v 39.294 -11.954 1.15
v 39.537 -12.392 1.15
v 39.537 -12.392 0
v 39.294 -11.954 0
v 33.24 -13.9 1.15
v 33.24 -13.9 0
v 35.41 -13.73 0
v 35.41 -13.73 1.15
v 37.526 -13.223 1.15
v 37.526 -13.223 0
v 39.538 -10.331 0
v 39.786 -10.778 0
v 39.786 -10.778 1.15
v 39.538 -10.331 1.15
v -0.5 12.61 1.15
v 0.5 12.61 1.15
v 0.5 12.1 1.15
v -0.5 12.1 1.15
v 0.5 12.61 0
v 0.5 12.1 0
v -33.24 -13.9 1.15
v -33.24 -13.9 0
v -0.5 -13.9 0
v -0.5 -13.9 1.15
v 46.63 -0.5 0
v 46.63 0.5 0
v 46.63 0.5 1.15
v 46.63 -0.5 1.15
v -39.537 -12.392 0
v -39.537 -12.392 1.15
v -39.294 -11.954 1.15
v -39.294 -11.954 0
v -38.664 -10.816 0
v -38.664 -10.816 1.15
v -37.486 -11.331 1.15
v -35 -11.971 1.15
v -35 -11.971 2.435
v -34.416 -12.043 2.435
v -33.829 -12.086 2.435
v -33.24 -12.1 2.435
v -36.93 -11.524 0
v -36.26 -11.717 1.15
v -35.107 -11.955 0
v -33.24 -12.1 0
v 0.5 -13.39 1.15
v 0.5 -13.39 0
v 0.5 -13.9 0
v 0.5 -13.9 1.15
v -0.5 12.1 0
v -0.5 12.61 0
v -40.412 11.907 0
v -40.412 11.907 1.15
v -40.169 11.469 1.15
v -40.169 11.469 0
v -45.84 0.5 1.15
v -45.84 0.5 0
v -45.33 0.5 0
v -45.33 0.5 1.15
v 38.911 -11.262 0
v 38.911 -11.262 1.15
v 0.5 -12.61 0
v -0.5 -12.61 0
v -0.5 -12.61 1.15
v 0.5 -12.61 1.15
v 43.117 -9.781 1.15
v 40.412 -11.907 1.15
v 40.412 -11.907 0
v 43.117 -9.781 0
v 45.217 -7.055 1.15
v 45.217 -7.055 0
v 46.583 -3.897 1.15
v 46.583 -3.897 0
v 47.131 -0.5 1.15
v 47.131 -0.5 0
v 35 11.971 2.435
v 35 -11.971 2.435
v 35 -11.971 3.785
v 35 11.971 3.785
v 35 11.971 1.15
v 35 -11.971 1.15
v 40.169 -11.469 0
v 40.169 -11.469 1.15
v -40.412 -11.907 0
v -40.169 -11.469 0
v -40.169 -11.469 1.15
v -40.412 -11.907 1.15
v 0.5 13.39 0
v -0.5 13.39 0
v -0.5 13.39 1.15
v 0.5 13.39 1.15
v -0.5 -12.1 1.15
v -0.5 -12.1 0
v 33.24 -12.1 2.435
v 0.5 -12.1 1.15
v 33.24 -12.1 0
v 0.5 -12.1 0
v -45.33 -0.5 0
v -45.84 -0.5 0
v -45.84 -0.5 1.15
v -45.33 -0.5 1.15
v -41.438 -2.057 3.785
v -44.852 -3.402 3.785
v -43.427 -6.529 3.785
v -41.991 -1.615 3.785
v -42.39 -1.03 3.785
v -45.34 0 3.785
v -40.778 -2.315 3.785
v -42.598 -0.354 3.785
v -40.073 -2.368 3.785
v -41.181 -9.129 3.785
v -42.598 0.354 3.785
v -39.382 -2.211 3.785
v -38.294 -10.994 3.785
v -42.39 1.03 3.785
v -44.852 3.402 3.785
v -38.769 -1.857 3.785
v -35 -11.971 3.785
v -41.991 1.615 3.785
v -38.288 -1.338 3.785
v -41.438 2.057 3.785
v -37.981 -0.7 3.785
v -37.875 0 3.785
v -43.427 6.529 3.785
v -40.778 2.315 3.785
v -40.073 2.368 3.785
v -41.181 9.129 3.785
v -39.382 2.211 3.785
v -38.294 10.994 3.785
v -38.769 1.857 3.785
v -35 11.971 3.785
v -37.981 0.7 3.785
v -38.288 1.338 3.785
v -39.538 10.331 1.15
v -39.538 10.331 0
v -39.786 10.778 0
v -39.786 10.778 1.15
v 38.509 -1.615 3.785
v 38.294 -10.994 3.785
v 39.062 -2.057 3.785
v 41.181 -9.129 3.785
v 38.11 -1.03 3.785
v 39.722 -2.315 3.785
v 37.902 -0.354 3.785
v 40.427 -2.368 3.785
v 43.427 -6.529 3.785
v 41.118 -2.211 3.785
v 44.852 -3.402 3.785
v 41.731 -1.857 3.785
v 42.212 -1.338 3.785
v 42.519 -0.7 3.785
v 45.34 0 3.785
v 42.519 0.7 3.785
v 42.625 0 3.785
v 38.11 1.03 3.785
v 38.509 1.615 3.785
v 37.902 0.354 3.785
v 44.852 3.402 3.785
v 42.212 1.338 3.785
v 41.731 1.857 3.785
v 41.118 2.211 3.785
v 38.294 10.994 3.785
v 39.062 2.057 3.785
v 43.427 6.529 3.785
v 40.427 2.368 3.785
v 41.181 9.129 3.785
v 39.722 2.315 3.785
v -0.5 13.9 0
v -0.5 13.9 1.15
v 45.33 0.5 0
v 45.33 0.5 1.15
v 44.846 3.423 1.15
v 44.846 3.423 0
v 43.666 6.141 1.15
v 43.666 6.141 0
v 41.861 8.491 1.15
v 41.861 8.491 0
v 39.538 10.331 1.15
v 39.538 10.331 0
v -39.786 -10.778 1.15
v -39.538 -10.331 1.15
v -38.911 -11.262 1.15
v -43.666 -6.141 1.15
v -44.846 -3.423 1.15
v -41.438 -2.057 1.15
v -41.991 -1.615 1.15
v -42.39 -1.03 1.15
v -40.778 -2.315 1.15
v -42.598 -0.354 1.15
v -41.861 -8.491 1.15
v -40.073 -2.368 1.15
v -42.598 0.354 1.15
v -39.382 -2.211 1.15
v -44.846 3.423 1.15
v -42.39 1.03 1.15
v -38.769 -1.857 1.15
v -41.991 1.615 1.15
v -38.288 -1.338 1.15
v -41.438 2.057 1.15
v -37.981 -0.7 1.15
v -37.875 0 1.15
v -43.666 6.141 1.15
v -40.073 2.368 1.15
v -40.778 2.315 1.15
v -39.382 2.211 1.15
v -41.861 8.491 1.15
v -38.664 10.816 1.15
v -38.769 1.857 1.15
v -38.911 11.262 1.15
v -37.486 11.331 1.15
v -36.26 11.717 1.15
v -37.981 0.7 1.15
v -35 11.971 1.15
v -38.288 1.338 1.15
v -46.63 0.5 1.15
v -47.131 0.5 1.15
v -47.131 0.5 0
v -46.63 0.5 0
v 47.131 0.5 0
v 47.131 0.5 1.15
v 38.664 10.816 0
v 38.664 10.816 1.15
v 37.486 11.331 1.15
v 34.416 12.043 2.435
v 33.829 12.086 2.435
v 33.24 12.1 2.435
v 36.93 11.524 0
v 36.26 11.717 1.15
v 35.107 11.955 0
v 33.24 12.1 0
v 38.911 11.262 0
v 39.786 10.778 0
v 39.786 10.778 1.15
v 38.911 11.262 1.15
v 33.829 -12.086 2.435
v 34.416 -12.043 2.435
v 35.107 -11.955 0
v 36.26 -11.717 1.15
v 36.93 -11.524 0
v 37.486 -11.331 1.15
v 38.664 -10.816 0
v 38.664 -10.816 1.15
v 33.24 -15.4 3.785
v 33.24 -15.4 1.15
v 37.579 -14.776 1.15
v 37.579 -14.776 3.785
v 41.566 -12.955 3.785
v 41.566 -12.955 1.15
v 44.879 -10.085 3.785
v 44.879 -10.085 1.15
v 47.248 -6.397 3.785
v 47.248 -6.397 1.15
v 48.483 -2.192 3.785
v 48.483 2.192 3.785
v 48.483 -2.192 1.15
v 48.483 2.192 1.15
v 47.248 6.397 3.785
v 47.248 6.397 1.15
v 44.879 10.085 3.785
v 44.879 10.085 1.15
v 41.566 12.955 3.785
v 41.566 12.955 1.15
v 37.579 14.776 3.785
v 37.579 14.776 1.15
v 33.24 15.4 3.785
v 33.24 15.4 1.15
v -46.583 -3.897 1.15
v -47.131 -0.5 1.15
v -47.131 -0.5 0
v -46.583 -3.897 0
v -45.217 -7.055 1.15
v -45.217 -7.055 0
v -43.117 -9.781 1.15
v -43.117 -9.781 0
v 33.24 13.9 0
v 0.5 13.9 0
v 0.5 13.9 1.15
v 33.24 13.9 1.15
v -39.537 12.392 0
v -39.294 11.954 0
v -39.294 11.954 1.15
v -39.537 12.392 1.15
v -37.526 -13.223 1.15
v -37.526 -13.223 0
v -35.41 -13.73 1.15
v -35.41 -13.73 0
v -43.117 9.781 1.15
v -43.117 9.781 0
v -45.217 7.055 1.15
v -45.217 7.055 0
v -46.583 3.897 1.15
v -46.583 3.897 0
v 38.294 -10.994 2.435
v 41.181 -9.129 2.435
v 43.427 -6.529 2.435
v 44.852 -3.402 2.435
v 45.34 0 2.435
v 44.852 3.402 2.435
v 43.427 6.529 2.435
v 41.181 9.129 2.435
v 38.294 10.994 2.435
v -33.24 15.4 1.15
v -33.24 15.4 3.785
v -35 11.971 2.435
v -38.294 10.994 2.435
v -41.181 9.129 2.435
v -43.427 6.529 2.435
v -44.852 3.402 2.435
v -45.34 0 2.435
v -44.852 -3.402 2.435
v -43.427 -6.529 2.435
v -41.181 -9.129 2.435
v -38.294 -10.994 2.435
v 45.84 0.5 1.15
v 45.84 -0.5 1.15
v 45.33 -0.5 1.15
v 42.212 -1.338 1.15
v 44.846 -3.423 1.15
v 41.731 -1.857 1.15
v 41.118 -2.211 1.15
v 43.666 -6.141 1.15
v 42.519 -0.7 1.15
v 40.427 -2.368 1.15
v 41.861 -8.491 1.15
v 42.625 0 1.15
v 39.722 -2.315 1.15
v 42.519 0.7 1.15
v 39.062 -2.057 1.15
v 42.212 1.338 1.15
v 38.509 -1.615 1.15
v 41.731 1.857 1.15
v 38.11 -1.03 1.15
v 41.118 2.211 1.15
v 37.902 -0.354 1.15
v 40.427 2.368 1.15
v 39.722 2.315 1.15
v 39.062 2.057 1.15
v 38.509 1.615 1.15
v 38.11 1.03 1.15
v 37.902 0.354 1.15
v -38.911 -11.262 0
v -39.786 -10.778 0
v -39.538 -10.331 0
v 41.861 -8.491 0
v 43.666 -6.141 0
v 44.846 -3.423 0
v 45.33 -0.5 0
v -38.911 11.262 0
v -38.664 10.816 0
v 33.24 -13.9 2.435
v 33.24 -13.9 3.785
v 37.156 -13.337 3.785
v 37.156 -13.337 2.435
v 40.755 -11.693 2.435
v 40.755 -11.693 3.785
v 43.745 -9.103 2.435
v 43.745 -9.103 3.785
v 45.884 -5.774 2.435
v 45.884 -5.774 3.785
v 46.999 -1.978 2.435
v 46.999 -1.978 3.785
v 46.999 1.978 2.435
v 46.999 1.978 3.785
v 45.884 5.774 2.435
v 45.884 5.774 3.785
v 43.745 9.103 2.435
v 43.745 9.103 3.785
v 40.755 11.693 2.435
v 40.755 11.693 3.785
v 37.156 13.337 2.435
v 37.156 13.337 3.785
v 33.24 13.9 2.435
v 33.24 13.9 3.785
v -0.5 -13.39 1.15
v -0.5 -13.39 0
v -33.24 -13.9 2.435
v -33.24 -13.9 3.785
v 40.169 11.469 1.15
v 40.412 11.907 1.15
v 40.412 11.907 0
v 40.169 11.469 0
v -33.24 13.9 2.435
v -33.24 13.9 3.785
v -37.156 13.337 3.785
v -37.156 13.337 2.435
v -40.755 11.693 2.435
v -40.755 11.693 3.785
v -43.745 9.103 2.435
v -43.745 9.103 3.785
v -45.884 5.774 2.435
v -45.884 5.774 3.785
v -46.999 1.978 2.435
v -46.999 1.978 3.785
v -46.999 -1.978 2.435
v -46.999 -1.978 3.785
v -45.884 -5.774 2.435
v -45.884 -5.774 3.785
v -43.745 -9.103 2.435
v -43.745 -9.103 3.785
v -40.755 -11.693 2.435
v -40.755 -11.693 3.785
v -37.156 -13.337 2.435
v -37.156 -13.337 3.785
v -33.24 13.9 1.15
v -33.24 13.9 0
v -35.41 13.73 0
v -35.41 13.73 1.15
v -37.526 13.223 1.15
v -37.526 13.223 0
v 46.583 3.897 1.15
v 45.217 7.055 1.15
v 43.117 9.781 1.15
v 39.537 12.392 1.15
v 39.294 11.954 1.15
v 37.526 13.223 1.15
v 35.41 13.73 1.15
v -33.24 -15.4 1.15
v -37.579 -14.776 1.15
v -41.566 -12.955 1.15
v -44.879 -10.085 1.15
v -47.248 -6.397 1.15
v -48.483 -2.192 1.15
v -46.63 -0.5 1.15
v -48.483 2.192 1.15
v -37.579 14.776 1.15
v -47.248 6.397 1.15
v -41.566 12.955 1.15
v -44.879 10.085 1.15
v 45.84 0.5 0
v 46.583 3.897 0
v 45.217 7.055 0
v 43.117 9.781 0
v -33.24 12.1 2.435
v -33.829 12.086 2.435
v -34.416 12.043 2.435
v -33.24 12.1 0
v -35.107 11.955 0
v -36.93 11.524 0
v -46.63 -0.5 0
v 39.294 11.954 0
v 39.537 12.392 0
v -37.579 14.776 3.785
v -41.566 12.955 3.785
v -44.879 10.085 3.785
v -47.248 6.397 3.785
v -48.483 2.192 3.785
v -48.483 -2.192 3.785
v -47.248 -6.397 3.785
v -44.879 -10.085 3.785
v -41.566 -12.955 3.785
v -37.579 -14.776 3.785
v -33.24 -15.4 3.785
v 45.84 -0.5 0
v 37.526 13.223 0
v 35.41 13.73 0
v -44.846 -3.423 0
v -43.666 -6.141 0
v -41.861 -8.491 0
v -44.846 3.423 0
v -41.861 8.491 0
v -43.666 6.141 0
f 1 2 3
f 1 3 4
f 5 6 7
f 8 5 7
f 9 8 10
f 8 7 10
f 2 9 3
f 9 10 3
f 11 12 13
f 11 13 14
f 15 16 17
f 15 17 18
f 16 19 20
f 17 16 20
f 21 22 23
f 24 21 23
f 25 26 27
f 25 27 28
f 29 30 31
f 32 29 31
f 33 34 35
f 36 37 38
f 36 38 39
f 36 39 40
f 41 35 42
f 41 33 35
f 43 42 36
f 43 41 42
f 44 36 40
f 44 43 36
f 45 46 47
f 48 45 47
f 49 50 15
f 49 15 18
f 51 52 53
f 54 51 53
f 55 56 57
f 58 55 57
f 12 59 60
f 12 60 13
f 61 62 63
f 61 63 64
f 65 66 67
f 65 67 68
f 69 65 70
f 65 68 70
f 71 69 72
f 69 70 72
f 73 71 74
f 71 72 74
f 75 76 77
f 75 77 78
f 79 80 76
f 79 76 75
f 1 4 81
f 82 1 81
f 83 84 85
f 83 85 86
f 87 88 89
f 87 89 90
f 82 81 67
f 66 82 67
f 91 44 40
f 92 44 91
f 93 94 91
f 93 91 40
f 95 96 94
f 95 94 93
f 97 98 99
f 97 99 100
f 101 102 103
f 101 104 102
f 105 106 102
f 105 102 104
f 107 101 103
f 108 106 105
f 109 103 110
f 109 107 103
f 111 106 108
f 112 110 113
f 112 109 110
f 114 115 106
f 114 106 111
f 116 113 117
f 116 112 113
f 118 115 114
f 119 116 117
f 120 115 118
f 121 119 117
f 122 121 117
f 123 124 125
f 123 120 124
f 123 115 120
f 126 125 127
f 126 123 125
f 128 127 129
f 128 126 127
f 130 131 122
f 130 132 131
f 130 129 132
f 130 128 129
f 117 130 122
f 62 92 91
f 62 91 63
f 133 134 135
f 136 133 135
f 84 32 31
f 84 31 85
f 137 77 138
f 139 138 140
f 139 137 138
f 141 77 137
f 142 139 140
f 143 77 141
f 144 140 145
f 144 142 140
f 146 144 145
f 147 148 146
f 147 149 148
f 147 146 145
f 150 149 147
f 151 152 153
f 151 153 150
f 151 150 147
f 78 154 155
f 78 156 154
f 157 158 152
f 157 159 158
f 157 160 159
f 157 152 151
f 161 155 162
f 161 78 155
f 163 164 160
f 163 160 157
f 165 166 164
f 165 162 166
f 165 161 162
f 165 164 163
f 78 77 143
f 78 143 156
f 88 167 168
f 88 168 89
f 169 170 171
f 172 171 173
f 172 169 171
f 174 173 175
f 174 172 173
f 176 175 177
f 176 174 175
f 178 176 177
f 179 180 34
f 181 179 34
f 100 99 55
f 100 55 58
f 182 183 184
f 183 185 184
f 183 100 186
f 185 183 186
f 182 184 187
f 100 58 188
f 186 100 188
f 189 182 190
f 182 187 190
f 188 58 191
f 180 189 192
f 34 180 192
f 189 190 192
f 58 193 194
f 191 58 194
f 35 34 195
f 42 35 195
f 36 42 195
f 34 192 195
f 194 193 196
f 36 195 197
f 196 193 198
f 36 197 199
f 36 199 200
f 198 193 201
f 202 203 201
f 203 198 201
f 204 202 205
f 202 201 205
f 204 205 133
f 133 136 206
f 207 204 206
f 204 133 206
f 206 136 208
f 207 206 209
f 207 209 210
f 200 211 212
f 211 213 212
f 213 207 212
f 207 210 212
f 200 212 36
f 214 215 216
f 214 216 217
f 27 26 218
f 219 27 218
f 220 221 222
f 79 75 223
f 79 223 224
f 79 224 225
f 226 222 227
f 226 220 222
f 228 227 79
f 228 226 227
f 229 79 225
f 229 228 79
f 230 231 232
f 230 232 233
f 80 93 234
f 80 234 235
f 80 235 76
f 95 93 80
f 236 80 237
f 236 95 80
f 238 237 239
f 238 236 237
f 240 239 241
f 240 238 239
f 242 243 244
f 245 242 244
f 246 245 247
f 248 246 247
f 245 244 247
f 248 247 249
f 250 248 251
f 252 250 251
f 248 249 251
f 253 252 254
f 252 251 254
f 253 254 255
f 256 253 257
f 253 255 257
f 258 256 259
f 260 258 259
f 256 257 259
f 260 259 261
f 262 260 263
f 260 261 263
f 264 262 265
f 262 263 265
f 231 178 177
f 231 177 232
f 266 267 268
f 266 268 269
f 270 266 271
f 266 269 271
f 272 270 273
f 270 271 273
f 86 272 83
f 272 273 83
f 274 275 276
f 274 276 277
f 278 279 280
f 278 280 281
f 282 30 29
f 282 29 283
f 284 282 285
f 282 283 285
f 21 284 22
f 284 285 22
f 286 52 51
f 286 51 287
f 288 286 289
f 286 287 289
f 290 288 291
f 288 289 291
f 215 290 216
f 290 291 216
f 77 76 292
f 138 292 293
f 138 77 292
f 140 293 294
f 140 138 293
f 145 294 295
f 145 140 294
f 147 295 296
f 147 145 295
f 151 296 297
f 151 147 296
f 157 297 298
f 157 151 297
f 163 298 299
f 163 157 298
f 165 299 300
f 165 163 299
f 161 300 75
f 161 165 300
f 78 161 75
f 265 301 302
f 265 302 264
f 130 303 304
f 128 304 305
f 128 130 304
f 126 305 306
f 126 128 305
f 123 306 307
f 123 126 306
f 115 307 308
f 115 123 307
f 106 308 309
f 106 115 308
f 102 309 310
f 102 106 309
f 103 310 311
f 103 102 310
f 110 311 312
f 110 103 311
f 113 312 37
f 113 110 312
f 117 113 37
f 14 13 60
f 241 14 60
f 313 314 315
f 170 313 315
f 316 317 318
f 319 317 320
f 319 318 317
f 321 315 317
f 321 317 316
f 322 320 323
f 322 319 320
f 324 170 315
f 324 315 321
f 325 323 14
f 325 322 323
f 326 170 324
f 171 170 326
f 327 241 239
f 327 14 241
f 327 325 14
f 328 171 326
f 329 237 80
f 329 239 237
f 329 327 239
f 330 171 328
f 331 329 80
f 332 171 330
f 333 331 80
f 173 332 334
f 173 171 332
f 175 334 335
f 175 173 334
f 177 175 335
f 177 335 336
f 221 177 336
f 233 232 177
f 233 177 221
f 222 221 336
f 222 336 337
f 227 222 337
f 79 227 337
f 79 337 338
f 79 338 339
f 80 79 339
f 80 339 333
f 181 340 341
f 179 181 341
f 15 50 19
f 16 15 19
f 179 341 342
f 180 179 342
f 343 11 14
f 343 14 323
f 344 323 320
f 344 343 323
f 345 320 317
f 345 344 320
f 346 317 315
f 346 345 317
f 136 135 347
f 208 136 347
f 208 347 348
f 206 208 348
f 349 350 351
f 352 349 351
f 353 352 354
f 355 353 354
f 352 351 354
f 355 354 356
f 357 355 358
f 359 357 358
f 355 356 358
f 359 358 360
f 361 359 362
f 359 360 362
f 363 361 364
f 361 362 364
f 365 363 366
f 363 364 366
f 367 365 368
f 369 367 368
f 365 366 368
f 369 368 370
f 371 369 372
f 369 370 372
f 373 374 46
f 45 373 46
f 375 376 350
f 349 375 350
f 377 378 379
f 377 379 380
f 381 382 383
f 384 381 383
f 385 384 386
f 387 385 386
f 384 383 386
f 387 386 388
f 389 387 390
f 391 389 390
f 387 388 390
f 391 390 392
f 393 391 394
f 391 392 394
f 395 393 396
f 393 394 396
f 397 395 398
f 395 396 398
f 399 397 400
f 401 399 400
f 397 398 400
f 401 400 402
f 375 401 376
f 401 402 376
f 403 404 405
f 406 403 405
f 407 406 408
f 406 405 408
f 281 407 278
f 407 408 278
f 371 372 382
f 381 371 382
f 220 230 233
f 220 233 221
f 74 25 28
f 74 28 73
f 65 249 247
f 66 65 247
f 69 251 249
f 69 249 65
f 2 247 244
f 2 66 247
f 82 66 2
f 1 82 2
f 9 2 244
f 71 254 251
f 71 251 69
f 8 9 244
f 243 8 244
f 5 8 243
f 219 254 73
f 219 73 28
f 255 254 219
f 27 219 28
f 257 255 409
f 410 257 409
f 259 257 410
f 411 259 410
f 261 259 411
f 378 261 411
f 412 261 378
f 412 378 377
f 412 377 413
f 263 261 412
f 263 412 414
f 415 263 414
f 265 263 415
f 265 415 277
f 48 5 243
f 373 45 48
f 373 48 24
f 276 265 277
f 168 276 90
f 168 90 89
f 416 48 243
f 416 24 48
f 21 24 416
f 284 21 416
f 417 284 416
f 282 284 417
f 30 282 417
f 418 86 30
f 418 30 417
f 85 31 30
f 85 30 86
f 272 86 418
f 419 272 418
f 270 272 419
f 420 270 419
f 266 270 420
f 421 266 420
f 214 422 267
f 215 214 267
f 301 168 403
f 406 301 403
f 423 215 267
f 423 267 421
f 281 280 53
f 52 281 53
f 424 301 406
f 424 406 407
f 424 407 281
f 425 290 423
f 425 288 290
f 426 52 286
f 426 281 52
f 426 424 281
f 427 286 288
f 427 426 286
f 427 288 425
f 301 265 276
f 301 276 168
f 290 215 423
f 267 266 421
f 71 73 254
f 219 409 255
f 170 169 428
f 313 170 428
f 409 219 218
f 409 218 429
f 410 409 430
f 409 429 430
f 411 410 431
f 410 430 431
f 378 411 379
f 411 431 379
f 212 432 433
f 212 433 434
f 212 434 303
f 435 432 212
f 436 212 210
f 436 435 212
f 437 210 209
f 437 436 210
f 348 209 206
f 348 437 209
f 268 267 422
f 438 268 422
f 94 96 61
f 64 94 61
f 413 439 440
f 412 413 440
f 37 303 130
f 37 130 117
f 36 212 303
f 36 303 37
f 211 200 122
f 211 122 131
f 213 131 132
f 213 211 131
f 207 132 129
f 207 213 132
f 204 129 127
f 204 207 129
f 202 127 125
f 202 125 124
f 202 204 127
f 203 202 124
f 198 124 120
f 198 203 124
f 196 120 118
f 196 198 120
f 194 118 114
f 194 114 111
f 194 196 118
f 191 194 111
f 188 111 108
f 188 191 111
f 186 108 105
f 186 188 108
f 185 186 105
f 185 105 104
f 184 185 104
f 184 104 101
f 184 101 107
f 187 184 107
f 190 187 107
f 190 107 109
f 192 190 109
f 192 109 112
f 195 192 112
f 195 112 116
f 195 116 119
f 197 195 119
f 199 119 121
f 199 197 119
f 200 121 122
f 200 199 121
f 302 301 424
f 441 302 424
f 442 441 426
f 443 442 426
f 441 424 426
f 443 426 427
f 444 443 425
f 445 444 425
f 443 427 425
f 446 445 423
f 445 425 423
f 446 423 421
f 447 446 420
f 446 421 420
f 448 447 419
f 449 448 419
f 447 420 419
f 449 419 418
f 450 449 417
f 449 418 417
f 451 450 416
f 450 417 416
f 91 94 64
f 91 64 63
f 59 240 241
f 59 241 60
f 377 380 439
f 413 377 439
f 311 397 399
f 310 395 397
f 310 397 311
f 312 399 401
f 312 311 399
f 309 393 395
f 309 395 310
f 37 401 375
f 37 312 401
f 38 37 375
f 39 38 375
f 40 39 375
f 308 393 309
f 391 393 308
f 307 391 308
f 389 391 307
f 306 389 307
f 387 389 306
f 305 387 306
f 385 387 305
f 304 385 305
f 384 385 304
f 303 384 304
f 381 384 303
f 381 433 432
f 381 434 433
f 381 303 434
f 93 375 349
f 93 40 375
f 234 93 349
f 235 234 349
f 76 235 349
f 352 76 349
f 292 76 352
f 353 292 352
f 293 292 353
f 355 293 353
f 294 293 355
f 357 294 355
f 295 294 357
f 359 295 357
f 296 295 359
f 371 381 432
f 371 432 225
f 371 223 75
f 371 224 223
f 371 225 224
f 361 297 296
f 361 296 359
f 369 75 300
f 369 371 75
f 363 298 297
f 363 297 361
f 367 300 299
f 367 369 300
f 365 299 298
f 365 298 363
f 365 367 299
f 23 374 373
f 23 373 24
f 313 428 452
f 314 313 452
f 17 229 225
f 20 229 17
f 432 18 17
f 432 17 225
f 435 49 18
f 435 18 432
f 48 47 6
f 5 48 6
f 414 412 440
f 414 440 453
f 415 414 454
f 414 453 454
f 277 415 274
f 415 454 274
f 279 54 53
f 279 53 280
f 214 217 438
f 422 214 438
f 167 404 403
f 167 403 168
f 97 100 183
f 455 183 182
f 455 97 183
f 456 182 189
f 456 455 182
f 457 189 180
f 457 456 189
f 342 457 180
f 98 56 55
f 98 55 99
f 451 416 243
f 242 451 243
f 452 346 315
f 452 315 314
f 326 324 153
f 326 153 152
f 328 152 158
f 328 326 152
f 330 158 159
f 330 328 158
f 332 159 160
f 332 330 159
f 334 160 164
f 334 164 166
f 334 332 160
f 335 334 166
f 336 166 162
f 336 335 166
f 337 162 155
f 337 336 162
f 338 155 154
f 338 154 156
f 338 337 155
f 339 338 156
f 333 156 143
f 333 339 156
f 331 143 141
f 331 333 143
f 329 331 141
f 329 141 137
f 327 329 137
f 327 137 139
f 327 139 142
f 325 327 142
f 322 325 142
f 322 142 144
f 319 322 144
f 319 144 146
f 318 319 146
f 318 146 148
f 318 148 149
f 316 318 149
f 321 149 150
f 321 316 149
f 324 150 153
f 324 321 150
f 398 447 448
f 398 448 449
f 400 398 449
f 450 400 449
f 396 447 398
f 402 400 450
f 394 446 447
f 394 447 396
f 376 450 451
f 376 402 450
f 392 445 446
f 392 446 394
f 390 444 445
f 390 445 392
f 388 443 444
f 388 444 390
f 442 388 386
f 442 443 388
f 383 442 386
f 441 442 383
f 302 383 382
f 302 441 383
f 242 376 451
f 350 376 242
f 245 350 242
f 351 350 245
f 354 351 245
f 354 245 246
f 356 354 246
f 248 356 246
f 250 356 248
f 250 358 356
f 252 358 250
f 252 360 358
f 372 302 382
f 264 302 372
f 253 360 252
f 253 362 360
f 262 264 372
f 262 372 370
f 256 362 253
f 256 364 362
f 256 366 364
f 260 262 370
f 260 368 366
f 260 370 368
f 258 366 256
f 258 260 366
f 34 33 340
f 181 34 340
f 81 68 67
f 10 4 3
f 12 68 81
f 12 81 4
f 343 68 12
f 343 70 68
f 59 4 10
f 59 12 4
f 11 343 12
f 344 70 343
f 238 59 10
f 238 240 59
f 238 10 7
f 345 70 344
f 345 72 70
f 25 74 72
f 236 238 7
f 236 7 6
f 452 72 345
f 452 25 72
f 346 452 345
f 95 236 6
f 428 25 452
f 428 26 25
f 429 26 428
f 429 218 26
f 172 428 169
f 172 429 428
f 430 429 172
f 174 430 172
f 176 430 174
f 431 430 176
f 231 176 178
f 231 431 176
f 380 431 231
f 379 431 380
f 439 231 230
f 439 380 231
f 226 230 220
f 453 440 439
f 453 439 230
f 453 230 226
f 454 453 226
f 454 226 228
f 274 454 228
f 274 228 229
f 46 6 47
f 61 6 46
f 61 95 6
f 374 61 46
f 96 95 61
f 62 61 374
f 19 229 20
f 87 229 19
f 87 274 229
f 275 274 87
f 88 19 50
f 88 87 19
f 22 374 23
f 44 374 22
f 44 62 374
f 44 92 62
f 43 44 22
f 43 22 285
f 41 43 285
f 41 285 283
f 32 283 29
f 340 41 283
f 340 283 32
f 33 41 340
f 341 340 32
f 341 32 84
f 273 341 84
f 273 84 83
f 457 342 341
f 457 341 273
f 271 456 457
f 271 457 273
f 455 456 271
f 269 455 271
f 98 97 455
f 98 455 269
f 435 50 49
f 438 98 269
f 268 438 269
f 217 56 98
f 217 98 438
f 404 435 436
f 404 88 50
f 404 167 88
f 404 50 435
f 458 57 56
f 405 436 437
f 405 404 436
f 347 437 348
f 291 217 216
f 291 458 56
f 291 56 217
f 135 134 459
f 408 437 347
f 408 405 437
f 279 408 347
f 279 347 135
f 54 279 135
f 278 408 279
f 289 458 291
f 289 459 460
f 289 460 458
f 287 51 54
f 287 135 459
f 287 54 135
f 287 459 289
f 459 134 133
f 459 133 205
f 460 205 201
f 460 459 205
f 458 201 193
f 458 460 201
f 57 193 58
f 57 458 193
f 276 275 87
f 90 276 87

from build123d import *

# Parameters (mm, degrees)
PAD_DEPTH       = 1.15
SKETCH001_W     = 1
SKETCH001_H     = 0.51
SKETCH001_W_2   = 0.51
SKETCH001_H_2   = 1
POCKET_DEPTH    = 1.15
PAD001_DEPTH    = 2.635
SKETCH003_R     = 2.375
PAD002_DEPTH    = 2.635
POCKET001_DEPTH = 1.35


with BuildPart() as part:
    # Sketch → Pad (new body)
    with BuildSketch(Plane.XY):
        with BuildLine():
            Line((-33.24, 13.9), (33.24, 13.9))
            ThreePointArc((33.24, -13.9), (47.14, 0), (33.24, 13.9))
            Line((-33.24, -13.9), (33.24, -13.9))
            ThreePointArc((-33.24, 13.9), (-47.14, 0), (-33.24, -13.9))
        make_face()
        with BuildLine():
            Line((-33.24, 12.1), (33.24, 12.1))
            ThreePointArc((33.24, -12.1), (45.34, 0), (33.24, 12.1))
            Line((-33.24, -12.1), (33.24, -12.1))
            ThreePointArc((-33.24, 12.1), (-45.34, 0), (-33.24, -12.1))
        make_face(mode=Mode.SUBTRACT)
    extrude(amount=PAD_DEPTH)

    # Sketch001 (on Face9 of Pad) → Pocket (cut)
    with BuildSketch(Plane(origin=(0, 0, 0), x_dir=(1, 0, 0), z_dir=(0, 0, -1))):
        with Locations((0, 12.355)):
            Rectangle(SKETCH001_W, SKETCH001_H)
        with Locations((0, 13.645)):
            Rectangle(SKETCH001_W, SKETCH001_H)
        with Locations((0, -12.355)):
            Rectangle(SKETCH001_W, SKETCH001_H)
        with Locations((0, -13.645)):
            Rectangle(SKETCH001_W, SKETCH001_H)
        with Locations((45.584665, 0)):
            Rectangle(SKETCH001_W_2, SKETCH001_H_2)
        with Locations((46.885, 0)):
            Rectangle(SKETCH001_W_2, SKETCH001_H_2)
        with Locations((-45.584665, 0)):
            Rectangle(SKETCH001_W_2, SKETCH001_H_2)
        with Locations((-46.885, 0)):
            Rectangle(SKETCH001_W_2, SKETCH001_H_2)
        Polygon((39.538496, 10.331454), (38.663876, 10.816264), (38.911129, 11.26232), (39.785749, 10.777511), align=None)
        Polygon((40.416164, 11.914809), (39.541544, 12.399619), (39.294291, 11.953563), (40.168911, 11.468753), align=None)
        Polygon((38.663876, -10.816264), (39.538496, -10.331454), (39.785749, -10.777511), (38.911129, -11.26232), align=None)
        Polygon((39.541544, -12.399619), (40.416164, -11.914809), (40.168911, -11.468753), (39.294291, -11.953563), align=None)
        Polygon((-39.538496, 10.331454), (-38.663876, 10.816264), (-38.911129, 11.26232), (-39.785749, 10.777511), align=None)
        Polygon((-40.416164, 11.914809), (-39.541544, 12.399619), (-39.294291, 11.953563), (-40.168911, 11.468753), align=None)
        Polygon((-39.541544, -12.399619), (-40.416164, -11.914809), (-40.168911, -11.468753), (-39.294291, -11.953563), align=None)
        Polygon((-38.663876, -10.816264), (-39.538496, -10.331454), (-39.785749, -10.777511), (-38.911129, -11.26232), align=None)
    extrude(amount=-POCKET_DEPTH, mode=Mode.SUBTRACT)

    # Sketch002 (on Face4 of Pocket) → Pad001 (join)
    with BuildSketch(Plane.XY.offset(1.15)):
        with BuildLine():
            Line((-33.24, 15.4), (33.24, 15.4))
            ThreePointArc((33.24, -15.4), (48.64, 0), (33.24, 15.4))
            Line((-33.24, -15.4), (33.24, -15.4))
            ThreePointArc((-33.24, 15.4), (-48.64, 0), (-33.24, -15.4))
        make_face()
        with BuildLine():
            ThreePointArc((-33.24, 12.1), (-45.34, 0), (-33.24, -12.1))
            Line((-33.24, -12.1), (33.24, -12.1))
            ThreePointArc((33.24, -12.1), (45.34, 0), (33.24, 12.1))
            Line((33.24, 12.1), (-33.24, 12.1))
        make_face(mode=Mode.SUBTRACT)
    extrude(amount=PAD001_DEPTH)

    # Sketch003 (on Face4 of Pocket) → Pad002 (join)
    with BuildSketch(Plane.XY.offset(1.15)):
        with BuildLine():
            ThreePointArc((-35, 11.971316), (-45.34, 0), (-35, -11.971316))
            Line((-35, 11.971316), (-35, -11.971316))
        make_face()
        with Locations((-40.25, 0)):
            Circle(SKETCH003_R, mode=Mode.SUBTRACT)
        with BuildLine():
            Line((35, -11.971316), (35, 11.971316))
            ThreePointArc((35, -11.971316), (45.34, 0), (35, 11.971316))
        make_face()
        with Locations((40.25, 0)):
            Circle(SKETCH003_R, mode=Mode.SUBTRACT)
    extrude(amount=PAD002_DEPTH)

    # Sketch004 (on Face95 of Pad002) → Pocket001 (cut)
    with BuildSketch(Plane.XY.offset(3.785)):
        with BuildLine():
            ThreePointArc((-33.24, 13.9), (-47.14, 0), (-33.24, -13.9))
            Line((-33.24, -13.9), (33.24, -13.9))
            ThreePointArc((33.24, -13.9), (47.14, 0), (33.24, 13.9))
            Line((33.24, 13.9), (-33.24, 13.9))
        make_face()
        with BuildLine():
            ThreePointArc((-33.24, 12.1), (-45.34, 0), (-33.24, -12.1))
            Line((-33.24, -12.1), (33.24, -12.1))
            ThreePointArc((33.24, -12.1), (45.34, 0), (33.24, 12.1))
            Line((-33.24, 12.1), (33.24, 12.1))
        make_face(mode=Mode.SUBTRACT)
    extrude(amount=-POCKET001_DEPTH, mode=Mode.SUBTRACT)


solid = part.part
